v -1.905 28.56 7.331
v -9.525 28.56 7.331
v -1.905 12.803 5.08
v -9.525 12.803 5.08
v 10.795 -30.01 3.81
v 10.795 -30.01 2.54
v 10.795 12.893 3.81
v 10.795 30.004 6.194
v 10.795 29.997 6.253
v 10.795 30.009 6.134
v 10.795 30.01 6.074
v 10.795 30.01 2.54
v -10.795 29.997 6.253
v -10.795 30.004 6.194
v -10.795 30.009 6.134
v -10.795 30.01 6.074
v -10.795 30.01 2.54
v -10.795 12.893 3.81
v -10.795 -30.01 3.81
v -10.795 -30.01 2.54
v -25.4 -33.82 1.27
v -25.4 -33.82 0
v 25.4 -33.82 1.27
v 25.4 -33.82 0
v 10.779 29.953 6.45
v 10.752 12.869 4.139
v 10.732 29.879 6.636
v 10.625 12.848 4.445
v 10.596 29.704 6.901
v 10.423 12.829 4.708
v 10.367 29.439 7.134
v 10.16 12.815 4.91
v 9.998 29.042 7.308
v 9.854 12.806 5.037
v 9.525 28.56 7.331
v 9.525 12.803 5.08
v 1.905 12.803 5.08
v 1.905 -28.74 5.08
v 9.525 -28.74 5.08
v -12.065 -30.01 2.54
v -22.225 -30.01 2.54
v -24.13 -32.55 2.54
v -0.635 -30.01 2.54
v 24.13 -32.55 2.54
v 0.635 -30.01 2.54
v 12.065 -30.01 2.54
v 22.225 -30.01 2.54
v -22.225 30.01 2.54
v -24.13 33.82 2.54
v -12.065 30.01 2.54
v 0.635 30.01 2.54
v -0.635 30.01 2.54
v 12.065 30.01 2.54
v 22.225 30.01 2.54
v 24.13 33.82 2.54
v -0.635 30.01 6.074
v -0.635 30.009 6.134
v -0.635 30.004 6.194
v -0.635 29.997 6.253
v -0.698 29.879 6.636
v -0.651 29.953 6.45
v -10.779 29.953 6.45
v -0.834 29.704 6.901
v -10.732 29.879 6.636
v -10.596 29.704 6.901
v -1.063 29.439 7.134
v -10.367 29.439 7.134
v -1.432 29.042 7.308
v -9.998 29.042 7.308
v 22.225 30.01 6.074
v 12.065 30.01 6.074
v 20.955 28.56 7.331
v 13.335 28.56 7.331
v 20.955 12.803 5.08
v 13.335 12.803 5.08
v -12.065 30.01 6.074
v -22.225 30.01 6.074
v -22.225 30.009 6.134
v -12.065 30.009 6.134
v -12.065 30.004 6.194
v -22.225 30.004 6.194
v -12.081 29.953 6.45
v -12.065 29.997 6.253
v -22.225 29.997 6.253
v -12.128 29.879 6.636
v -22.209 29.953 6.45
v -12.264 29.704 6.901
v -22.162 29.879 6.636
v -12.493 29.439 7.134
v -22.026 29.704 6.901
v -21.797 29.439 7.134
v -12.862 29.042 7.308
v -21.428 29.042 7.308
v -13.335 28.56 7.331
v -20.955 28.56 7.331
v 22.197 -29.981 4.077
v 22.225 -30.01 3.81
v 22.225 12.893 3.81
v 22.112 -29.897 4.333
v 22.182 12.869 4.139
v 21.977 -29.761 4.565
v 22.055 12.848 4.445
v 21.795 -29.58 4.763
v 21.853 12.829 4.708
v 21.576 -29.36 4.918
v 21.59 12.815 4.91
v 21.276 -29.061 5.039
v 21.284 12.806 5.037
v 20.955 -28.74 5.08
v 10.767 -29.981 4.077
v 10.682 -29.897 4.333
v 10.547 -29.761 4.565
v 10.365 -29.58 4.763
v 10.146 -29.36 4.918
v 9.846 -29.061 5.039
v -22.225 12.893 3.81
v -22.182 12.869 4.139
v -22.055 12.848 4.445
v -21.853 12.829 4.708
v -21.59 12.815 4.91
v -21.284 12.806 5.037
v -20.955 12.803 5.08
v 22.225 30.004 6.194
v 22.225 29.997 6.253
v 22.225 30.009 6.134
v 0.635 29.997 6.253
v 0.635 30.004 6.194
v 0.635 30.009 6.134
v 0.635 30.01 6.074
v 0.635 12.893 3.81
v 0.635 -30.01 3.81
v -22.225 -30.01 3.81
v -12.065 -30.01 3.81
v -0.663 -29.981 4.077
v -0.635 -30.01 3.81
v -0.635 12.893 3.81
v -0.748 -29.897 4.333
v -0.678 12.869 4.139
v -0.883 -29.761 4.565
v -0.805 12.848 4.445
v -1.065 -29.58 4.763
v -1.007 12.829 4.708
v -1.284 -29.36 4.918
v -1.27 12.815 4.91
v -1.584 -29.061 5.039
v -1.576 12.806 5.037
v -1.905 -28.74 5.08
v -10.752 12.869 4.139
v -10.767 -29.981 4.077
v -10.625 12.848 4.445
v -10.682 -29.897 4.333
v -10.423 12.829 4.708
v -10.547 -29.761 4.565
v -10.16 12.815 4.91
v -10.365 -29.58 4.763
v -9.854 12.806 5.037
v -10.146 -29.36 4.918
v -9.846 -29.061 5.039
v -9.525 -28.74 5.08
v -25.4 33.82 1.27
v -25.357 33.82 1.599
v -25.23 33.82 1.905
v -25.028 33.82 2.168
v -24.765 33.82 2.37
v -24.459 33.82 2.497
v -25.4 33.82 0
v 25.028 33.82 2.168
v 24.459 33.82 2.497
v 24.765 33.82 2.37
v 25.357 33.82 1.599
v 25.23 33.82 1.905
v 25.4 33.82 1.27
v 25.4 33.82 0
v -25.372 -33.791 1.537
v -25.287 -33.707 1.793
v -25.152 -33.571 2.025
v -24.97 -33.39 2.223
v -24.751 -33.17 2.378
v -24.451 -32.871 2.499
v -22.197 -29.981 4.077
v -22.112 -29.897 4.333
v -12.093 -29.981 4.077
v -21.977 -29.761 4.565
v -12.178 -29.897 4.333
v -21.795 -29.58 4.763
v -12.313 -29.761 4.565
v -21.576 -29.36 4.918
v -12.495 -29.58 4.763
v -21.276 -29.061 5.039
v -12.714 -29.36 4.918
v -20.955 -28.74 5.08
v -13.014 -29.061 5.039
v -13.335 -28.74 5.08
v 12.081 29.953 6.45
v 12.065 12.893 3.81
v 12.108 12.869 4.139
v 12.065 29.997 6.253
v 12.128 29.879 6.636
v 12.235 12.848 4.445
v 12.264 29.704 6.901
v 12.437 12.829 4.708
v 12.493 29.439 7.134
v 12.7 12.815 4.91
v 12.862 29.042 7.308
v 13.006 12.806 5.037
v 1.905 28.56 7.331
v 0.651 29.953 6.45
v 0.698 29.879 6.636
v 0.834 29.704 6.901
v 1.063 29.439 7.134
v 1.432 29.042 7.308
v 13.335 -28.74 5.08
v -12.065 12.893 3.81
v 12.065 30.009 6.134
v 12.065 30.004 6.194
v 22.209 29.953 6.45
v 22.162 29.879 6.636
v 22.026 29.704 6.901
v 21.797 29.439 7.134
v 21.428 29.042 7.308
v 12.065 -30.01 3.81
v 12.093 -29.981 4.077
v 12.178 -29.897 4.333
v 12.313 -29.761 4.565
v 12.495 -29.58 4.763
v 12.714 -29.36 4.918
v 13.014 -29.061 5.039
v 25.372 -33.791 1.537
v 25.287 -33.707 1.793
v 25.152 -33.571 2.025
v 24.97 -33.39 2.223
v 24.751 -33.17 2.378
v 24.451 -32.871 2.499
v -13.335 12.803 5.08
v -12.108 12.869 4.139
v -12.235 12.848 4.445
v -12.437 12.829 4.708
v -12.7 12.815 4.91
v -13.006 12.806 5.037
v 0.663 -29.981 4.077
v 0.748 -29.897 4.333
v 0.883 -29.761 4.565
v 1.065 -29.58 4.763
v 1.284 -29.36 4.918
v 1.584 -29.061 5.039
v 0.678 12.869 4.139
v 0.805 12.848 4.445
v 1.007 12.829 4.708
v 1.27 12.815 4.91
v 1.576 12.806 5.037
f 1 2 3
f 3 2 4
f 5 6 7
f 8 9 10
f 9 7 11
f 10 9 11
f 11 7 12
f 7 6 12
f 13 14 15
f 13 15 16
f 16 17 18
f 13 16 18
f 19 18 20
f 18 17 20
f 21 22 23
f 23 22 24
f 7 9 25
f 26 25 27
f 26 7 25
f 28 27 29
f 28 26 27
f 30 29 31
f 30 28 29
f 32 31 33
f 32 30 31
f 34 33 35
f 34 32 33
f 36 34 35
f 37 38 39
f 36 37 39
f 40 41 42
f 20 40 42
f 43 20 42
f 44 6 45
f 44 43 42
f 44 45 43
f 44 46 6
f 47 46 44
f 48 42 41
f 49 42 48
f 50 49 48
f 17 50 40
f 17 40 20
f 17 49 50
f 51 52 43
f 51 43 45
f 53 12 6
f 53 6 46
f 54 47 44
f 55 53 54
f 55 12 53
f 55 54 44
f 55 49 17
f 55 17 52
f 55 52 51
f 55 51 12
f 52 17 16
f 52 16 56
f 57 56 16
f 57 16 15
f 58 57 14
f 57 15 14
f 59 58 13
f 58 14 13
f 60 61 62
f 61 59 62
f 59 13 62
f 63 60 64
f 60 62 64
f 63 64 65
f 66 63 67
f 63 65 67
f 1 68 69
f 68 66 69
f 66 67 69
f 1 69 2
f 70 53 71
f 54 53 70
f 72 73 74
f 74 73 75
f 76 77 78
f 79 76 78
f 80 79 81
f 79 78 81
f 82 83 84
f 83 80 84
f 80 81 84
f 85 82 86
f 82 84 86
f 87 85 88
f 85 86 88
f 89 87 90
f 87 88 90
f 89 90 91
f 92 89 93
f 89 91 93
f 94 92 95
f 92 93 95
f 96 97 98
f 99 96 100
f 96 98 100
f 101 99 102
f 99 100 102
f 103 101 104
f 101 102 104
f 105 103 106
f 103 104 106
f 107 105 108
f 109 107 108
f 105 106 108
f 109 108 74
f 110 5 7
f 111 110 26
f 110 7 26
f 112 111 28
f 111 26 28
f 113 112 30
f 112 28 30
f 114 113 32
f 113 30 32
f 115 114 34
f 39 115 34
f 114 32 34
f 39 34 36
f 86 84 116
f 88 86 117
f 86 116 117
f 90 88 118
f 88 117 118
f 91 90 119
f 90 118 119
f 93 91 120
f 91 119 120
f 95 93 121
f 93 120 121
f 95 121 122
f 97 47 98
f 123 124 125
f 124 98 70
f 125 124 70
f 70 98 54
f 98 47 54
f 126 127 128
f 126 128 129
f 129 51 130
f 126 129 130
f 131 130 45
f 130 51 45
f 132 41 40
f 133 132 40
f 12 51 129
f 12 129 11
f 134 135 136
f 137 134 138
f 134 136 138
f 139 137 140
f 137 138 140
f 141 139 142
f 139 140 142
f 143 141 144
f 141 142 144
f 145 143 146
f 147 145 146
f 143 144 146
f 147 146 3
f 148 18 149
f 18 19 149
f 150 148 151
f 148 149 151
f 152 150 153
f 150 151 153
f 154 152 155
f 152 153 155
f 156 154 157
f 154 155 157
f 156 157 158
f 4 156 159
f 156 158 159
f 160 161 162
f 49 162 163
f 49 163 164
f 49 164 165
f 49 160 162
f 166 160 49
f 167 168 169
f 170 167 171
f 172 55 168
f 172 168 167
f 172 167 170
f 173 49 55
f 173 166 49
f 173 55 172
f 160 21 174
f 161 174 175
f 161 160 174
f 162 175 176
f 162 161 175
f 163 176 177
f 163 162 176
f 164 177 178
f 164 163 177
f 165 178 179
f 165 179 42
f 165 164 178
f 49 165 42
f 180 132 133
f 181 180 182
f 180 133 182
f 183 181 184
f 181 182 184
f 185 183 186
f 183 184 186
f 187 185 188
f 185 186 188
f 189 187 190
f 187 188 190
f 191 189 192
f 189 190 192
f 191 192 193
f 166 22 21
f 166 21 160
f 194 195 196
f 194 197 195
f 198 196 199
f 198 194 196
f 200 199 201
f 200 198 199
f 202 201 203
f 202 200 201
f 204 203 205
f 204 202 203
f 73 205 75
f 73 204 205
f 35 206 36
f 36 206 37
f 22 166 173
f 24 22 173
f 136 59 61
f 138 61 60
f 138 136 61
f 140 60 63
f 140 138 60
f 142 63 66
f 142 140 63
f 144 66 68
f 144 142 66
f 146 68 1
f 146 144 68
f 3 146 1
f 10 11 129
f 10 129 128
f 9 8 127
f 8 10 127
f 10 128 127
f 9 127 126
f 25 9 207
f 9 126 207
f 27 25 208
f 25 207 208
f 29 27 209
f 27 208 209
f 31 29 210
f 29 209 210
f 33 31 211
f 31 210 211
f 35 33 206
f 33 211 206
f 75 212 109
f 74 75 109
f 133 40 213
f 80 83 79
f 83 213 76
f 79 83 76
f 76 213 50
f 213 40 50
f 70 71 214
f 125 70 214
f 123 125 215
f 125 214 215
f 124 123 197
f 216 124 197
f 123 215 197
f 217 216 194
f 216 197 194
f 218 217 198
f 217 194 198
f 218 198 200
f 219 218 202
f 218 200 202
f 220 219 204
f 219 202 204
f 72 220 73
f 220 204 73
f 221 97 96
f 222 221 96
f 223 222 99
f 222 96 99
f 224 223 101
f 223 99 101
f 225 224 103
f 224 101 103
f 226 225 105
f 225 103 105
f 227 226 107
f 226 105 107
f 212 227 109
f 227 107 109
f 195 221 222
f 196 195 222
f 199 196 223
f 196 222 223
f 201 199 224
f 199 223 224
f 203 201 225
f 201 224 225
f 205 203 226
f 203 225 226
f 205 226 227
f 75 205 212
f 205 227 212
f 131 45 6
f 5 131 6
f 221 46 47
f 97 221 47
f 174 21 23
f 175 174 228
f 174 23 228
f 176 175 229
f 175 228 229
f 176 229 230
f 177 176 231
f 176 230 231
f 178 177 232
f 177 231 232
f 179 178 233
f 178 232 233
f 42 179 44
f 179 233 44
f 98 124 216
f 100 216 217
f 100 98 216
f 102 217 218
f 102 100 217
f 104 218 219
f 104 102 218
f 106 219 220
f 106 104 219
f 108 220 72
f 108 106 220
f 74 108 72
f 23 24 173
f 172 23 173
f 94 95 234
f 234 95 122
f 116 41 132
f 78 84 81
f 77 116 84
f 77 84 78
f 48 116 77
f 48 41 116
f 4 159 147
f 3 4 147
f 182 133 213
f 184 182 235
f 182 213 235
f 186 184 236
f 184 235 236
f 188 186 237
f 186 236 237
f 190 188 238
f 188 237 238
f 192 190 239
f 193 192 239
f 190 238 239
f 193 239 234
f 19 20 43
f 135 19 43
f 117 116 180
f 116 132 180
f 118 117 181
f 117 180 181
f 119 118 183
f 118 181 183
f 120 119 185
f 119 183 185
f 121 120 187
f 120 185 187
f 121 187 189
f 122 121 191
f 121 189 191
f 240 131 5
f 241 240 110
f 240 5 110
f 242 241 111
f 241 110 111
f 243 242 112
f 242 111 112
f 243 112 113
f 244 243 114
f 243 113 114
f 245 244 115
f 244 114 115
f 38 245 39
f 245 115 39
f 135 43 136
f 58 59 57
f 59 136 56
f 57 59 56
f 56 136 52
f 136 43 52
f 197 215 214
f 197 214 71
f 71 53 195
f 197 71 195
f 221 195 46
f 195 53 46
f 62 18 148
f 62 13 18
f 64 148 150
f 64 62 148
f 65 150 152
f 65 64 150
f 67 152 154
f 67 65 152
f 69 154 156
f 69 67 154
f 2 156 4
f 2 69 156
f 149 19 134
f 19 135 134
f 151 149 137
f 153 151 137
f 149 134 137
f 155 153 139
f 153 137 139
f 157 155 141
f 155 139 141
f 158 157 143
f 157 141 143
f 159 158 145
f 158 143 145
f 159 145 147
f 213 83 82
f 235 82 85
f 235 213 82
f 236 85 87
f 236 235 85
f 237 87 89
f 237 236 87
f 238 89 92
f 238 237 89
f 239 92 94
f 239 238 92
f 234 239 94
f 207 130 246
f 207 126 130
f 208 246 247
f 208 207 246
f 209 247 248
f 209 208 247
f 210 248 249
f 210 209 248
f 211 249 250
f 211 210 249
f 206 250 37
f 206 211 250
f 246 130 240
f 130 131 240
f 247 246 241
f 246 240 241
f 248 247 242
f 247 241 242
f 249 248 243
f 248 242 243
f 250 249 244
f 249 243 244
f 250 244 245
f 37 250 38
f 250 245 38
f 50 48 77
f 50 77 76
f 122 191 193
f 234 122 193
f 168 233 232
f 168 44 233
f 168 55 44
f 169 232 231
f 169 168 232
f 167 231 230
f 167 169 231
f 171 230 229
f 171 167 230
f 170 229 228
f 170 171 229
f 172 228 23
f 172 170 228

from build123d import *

# Parameters (mm, degrees)
F0_W         = 10.16
F0_H         = 17.20733324
F1_DEPTH     = 7.62
F0_H_2       = 42.8125401959
F2_DEPTH     = 5.08
F0_W_2       = 50.8
F0_H_3       = 67.63987211
F3_DEPTH     = 2.54
F4_T4_DEPTH  = 102.5816286105
F4_T9_DEPTH  = 102.5816286105
F4_T14_DEPTH = 102.5816286105
F4_T19_DEPTH = 102.5816286105
F5_R         = 1.27
F6_R         = 1.27


# Not quite as in the source:
# - a fillet or chamfer that OpenCascade refuses, or shapes differently, is made with other operations: its cross-section is extruded or revolved along the edge and cut away or added
# - two fillets or chamfers of one size are made in one step
# - ends of sketch curves that miss each other by under 0.0002 mm in the source are joined


with BuildPart() as f1:
    # F0 (on Top) → F1 (new body)
    with BuildSketch(Plane.XY):
        with Locations((-17.1449951105, 21.4062702746)):
            Rectangle(F0_W, F0_H)
    extrude(amount=F1_DEPTH)

    # F0 (on Top) → F2 (join)
    with BuildSketch(Plane.XY):
        with Locations((-17.1449951105, 21.4062702746)):
            Rectangle(F0_W, F0_H)
        with Locations((-17.1449951105, -8.6036664434)):
            Rectangle(F0_W, F0_H_2)
    extrude(amount=F2_DEPTH)



with BuildPart() as f1b:
    # F0 (on Top) → F1, piece 2 (new body)
    with BuildSketch(Plane.XY):
        with Locations((-5.7149951105, 21.4062702746)):
            Rectangle(F0_W, F0_H)
    extrude(amount=F1_DEPTH)

    # F0 (on Top) → F2, piece 2 (join)
    with BuildSketch(Plane.XY):
        with Locations((-5.7149951105, -8.6036664434)):
            Rectangle(F0_W, F0_H_2)
        with Locations((-5.7149951105, 21.4062702746)):
            Rectangle(F0_W, F0_H)
    extrude(amount=F2_DEPTH)


with BuildPart() as f1c:
    # F0 (on Top) → F1, piece 3 (new body)
    with BuildSketch(Plane.XY):
        with Locations((5.7150048895, 21.4062702746)):
            Rectangle(F0_W, F0_H)
    extrude(amount=F1_DEPTH)

    # F0 (on Top) → F2, piece 3 (join)
    with BuildSketch(Plane.XY):
        with Locations((5.7150048895, -8.6036664434)):
            Rectangle(F0_W, F0_H_2)
        with Locations((5.7150048895, 21.4062702746)):
            Rectangle(F0_W, F0_H)
    extrude(amount=F2_DEPTH)


with BuildPart() as f1d:
    # F0 (on Top) → F1, piece 4 (new body)
    with BuildSketch(Plane.XY):
        with Locations((17.1450048895, 21.4062702746)):
            Rectangle(F0_W, F0_H)
    extrude(amount=F1_DEPTH)

    # F0 (on Top) → F2, piece 4 (join)
    with BuildSketch(Plane.XY):
        with Locations((17.1450048895, -8.6036664434)):
            Rectangle(F0_W, F0_H_2)
        with Locations((17.1450048895, 21.4062702746)):
            Rectangle(F0_W, F0_H)
    extrude(amount=F2_DEPTH)


with BuildPart() as f1_1:
    add(f1.part)

    add(f1b.part)  # F3 merges F1b

    add(f1c.part)  # F3 merges F1c

    add(f1d.part)  # F3 merges F1d
    # F0 (on Top) → F3 (join)
    with BuildSketch(Plane.XY):
        with Locations((0, -1.609e-07)):
            Rectangle(F0_W_2, F0_H_3)
        Polygon((-22.2249951105, 30.0099368946), (-12.0649951105, 30.0099368946), (-12.0649951105, 12.8026036546), (-12.0649951105, -30.0099365413), (-22.2249951105, -30.0099365413), (-22.2249951105, 12.8026036546), align=None, mode=Mode.SUBTRACT)
        Polygon((-10.7949951105, -30.0099365413), (-10.7949951105, 12.8026036546), (-10.7949951105, 30.0099368946), (-0.6349951105, 30.0099368946), (-0.6349951105, 12.8026036546), (-0.6349951105, -30.0099365413), align=None, mode=Mode.SUBTRACT)
        Polygon((0.6350048895, -30.0099365413), (0.6350048895, 12.8026036546), (0.6350048895, 30.0099368946), (10.7950048895, 30.0099368946), (10.7950048895, 12.8026036546), (10.7950048895, -30.0099365413), align=None, mode=Mode.SUBTRACT)
        Polygon((12.0650048895, -30.0099365413), (12.0650048895, 12.8026036546), (12.0650048895, 30.0099368946), (22.2250048895, 30.0099368946), (22.2250048895, 12.8026036546), (22.2250048895, -30.0099365413), align=None, mode=Mode.SUBTRACT)
    extrude(amount=F3_DEPTH)

    # F4: chamfer of 17.78 x 2.54 on 4 edges, made by hand


with BuildPart() as f4_tool2:
    # F4_s3 → F4_t4 (new body)
    with BuildSketch(Plane.YZ.offset(-68.4358094158)):
        Polygon((30.5826036546, 7.62), (12.8026036546, 5.08), (12.8026036546, 7.62), align=None)
    extrude(amount=F4_T4_DEPTH)

    split(bisect_by=Plane.XY.offset(5.08), keep=Keep.TOP)


with BuildPart() as f1_2:
    add(f1_1.part)

    # F4_t1: cut F4_tool2
    add(f4_tool2.part, mode=Mode.SUBTRACT)


with BuildPart() as f4_tool7:
    # F4_s8 → F4_t9 (new body)
    with BuildSketch(Plane.YZ.offset(-57.0058094158)):
        Polygon((12.8026036546, 5.08), (30.5826036546, 7.62), (12.8026036546, 7.62), align=None)
    extrude(amount=F4_T9_DEPTH)

    split(bisect_by=Plane.XY.offset(5.08), keep=Keep.TOP)


with BuildPart() as f1_3:
    add(f1_2.part)

    # F4_t6: cut F4_tool7
    add(f4_tool7.part, mode=Mode.SUBTRACT)


with BuildPart() as f4_tool12:
    # F4_s13 → F4_t14 (new body)
    with BuildSketch(Plane.YZ.offset(-45.5758094158)):
        Polygon((12.8026036546, 5.08), (30.5826036546, 7.62), (12.8026036546, 7.62), align=None)
    extrude(amount=F4_T14_DEPTH)

    split(bisect_by=Plane.XY.offset(5.08), keep=Keep.TOP)


with BuildPart() as f1_4:
    add(f1_3.part)

    # F4_t11: cut F4_tool12
    add(f4_tool12.part, mode=Mode.SUBTRACT)


with BuildPart() as f4_tool17:
    # F4_s18 → F4_t19 (new body)
    with BuildSketch(Plane.YZ.offset(-34.1458094158)):
        Polygon((12.8026036546, 5.08), (30.5826036546, 7.62), (12.8026036546, 7.62), align=None)
    extrude(amount=F4_T19_DEPTH)

    split(bisect_by=Plane.XY.offset(5.08), keep=Keep.TOP)


with BuildPart() as f1_5:
    add(f1_4.part)

    # F4_t16: cut F4_tool17
    add(f4_tool17.part, mode=Mode.SUBTRACT)

    # F5
    f5_edges = [f1_5.edges().sort_by_distance(p)[0] for p in [
        (0, -33.819936, 2.54),
        (-25.4, 0, 2.54),
        (25.4, 0, 2.54),
    ]]
    fillet(f5_edges, radius=F5_R)

    # F6
    f6_edges = [f1_5.edges().sort_by_distance(p)[0] for p in [
        (-12.064995, -8.603666, 5.08),
        (-17.144995, -30.009937, 5.08),
        (-22.224995, -8.603666, 5.08),
        (-5.714995, -30.009937, 5.08),
        (-10.794995, -8.603666, 5.08),
        (-0.634995, -8.603666, 5.08),
        (0.635005, -8.603666, 5.08),
        (10.795005, -8.603666, 5.08),
        (5.715005, -30.009937, 5.08),
        (17.145005, -30.009937, 5.08),
        (12.065005, -8.603666, 5.08),
        (22.225005, -8.603666, 5.08),
        (-17.144995, 30.009937, 7.53819),
        (-12.064995, 21.40627, 6.309095),
        (-22.224995, 21.40627, 6.309095),
        (-10.794995, 21.40627, 6.309095),
        (-5.714995, 30.009937, 7.53819),
        (-0.634995, 21.40627, 6.309095),
        (0.635005, 21.40627, 6.309095),
        (5.715005, 30.009937, 7.53819),
        (10.795005, 21.40627, 6.309095),
        (12.065005, 21.40627, 6.309095),
        (17.145005, 30.009937, 7.53819),
        (22.225005, 21.40627, 6.309095),
    ]]
    fillet(f6_edges, radius=F6_R)


solid = f1_5.part
